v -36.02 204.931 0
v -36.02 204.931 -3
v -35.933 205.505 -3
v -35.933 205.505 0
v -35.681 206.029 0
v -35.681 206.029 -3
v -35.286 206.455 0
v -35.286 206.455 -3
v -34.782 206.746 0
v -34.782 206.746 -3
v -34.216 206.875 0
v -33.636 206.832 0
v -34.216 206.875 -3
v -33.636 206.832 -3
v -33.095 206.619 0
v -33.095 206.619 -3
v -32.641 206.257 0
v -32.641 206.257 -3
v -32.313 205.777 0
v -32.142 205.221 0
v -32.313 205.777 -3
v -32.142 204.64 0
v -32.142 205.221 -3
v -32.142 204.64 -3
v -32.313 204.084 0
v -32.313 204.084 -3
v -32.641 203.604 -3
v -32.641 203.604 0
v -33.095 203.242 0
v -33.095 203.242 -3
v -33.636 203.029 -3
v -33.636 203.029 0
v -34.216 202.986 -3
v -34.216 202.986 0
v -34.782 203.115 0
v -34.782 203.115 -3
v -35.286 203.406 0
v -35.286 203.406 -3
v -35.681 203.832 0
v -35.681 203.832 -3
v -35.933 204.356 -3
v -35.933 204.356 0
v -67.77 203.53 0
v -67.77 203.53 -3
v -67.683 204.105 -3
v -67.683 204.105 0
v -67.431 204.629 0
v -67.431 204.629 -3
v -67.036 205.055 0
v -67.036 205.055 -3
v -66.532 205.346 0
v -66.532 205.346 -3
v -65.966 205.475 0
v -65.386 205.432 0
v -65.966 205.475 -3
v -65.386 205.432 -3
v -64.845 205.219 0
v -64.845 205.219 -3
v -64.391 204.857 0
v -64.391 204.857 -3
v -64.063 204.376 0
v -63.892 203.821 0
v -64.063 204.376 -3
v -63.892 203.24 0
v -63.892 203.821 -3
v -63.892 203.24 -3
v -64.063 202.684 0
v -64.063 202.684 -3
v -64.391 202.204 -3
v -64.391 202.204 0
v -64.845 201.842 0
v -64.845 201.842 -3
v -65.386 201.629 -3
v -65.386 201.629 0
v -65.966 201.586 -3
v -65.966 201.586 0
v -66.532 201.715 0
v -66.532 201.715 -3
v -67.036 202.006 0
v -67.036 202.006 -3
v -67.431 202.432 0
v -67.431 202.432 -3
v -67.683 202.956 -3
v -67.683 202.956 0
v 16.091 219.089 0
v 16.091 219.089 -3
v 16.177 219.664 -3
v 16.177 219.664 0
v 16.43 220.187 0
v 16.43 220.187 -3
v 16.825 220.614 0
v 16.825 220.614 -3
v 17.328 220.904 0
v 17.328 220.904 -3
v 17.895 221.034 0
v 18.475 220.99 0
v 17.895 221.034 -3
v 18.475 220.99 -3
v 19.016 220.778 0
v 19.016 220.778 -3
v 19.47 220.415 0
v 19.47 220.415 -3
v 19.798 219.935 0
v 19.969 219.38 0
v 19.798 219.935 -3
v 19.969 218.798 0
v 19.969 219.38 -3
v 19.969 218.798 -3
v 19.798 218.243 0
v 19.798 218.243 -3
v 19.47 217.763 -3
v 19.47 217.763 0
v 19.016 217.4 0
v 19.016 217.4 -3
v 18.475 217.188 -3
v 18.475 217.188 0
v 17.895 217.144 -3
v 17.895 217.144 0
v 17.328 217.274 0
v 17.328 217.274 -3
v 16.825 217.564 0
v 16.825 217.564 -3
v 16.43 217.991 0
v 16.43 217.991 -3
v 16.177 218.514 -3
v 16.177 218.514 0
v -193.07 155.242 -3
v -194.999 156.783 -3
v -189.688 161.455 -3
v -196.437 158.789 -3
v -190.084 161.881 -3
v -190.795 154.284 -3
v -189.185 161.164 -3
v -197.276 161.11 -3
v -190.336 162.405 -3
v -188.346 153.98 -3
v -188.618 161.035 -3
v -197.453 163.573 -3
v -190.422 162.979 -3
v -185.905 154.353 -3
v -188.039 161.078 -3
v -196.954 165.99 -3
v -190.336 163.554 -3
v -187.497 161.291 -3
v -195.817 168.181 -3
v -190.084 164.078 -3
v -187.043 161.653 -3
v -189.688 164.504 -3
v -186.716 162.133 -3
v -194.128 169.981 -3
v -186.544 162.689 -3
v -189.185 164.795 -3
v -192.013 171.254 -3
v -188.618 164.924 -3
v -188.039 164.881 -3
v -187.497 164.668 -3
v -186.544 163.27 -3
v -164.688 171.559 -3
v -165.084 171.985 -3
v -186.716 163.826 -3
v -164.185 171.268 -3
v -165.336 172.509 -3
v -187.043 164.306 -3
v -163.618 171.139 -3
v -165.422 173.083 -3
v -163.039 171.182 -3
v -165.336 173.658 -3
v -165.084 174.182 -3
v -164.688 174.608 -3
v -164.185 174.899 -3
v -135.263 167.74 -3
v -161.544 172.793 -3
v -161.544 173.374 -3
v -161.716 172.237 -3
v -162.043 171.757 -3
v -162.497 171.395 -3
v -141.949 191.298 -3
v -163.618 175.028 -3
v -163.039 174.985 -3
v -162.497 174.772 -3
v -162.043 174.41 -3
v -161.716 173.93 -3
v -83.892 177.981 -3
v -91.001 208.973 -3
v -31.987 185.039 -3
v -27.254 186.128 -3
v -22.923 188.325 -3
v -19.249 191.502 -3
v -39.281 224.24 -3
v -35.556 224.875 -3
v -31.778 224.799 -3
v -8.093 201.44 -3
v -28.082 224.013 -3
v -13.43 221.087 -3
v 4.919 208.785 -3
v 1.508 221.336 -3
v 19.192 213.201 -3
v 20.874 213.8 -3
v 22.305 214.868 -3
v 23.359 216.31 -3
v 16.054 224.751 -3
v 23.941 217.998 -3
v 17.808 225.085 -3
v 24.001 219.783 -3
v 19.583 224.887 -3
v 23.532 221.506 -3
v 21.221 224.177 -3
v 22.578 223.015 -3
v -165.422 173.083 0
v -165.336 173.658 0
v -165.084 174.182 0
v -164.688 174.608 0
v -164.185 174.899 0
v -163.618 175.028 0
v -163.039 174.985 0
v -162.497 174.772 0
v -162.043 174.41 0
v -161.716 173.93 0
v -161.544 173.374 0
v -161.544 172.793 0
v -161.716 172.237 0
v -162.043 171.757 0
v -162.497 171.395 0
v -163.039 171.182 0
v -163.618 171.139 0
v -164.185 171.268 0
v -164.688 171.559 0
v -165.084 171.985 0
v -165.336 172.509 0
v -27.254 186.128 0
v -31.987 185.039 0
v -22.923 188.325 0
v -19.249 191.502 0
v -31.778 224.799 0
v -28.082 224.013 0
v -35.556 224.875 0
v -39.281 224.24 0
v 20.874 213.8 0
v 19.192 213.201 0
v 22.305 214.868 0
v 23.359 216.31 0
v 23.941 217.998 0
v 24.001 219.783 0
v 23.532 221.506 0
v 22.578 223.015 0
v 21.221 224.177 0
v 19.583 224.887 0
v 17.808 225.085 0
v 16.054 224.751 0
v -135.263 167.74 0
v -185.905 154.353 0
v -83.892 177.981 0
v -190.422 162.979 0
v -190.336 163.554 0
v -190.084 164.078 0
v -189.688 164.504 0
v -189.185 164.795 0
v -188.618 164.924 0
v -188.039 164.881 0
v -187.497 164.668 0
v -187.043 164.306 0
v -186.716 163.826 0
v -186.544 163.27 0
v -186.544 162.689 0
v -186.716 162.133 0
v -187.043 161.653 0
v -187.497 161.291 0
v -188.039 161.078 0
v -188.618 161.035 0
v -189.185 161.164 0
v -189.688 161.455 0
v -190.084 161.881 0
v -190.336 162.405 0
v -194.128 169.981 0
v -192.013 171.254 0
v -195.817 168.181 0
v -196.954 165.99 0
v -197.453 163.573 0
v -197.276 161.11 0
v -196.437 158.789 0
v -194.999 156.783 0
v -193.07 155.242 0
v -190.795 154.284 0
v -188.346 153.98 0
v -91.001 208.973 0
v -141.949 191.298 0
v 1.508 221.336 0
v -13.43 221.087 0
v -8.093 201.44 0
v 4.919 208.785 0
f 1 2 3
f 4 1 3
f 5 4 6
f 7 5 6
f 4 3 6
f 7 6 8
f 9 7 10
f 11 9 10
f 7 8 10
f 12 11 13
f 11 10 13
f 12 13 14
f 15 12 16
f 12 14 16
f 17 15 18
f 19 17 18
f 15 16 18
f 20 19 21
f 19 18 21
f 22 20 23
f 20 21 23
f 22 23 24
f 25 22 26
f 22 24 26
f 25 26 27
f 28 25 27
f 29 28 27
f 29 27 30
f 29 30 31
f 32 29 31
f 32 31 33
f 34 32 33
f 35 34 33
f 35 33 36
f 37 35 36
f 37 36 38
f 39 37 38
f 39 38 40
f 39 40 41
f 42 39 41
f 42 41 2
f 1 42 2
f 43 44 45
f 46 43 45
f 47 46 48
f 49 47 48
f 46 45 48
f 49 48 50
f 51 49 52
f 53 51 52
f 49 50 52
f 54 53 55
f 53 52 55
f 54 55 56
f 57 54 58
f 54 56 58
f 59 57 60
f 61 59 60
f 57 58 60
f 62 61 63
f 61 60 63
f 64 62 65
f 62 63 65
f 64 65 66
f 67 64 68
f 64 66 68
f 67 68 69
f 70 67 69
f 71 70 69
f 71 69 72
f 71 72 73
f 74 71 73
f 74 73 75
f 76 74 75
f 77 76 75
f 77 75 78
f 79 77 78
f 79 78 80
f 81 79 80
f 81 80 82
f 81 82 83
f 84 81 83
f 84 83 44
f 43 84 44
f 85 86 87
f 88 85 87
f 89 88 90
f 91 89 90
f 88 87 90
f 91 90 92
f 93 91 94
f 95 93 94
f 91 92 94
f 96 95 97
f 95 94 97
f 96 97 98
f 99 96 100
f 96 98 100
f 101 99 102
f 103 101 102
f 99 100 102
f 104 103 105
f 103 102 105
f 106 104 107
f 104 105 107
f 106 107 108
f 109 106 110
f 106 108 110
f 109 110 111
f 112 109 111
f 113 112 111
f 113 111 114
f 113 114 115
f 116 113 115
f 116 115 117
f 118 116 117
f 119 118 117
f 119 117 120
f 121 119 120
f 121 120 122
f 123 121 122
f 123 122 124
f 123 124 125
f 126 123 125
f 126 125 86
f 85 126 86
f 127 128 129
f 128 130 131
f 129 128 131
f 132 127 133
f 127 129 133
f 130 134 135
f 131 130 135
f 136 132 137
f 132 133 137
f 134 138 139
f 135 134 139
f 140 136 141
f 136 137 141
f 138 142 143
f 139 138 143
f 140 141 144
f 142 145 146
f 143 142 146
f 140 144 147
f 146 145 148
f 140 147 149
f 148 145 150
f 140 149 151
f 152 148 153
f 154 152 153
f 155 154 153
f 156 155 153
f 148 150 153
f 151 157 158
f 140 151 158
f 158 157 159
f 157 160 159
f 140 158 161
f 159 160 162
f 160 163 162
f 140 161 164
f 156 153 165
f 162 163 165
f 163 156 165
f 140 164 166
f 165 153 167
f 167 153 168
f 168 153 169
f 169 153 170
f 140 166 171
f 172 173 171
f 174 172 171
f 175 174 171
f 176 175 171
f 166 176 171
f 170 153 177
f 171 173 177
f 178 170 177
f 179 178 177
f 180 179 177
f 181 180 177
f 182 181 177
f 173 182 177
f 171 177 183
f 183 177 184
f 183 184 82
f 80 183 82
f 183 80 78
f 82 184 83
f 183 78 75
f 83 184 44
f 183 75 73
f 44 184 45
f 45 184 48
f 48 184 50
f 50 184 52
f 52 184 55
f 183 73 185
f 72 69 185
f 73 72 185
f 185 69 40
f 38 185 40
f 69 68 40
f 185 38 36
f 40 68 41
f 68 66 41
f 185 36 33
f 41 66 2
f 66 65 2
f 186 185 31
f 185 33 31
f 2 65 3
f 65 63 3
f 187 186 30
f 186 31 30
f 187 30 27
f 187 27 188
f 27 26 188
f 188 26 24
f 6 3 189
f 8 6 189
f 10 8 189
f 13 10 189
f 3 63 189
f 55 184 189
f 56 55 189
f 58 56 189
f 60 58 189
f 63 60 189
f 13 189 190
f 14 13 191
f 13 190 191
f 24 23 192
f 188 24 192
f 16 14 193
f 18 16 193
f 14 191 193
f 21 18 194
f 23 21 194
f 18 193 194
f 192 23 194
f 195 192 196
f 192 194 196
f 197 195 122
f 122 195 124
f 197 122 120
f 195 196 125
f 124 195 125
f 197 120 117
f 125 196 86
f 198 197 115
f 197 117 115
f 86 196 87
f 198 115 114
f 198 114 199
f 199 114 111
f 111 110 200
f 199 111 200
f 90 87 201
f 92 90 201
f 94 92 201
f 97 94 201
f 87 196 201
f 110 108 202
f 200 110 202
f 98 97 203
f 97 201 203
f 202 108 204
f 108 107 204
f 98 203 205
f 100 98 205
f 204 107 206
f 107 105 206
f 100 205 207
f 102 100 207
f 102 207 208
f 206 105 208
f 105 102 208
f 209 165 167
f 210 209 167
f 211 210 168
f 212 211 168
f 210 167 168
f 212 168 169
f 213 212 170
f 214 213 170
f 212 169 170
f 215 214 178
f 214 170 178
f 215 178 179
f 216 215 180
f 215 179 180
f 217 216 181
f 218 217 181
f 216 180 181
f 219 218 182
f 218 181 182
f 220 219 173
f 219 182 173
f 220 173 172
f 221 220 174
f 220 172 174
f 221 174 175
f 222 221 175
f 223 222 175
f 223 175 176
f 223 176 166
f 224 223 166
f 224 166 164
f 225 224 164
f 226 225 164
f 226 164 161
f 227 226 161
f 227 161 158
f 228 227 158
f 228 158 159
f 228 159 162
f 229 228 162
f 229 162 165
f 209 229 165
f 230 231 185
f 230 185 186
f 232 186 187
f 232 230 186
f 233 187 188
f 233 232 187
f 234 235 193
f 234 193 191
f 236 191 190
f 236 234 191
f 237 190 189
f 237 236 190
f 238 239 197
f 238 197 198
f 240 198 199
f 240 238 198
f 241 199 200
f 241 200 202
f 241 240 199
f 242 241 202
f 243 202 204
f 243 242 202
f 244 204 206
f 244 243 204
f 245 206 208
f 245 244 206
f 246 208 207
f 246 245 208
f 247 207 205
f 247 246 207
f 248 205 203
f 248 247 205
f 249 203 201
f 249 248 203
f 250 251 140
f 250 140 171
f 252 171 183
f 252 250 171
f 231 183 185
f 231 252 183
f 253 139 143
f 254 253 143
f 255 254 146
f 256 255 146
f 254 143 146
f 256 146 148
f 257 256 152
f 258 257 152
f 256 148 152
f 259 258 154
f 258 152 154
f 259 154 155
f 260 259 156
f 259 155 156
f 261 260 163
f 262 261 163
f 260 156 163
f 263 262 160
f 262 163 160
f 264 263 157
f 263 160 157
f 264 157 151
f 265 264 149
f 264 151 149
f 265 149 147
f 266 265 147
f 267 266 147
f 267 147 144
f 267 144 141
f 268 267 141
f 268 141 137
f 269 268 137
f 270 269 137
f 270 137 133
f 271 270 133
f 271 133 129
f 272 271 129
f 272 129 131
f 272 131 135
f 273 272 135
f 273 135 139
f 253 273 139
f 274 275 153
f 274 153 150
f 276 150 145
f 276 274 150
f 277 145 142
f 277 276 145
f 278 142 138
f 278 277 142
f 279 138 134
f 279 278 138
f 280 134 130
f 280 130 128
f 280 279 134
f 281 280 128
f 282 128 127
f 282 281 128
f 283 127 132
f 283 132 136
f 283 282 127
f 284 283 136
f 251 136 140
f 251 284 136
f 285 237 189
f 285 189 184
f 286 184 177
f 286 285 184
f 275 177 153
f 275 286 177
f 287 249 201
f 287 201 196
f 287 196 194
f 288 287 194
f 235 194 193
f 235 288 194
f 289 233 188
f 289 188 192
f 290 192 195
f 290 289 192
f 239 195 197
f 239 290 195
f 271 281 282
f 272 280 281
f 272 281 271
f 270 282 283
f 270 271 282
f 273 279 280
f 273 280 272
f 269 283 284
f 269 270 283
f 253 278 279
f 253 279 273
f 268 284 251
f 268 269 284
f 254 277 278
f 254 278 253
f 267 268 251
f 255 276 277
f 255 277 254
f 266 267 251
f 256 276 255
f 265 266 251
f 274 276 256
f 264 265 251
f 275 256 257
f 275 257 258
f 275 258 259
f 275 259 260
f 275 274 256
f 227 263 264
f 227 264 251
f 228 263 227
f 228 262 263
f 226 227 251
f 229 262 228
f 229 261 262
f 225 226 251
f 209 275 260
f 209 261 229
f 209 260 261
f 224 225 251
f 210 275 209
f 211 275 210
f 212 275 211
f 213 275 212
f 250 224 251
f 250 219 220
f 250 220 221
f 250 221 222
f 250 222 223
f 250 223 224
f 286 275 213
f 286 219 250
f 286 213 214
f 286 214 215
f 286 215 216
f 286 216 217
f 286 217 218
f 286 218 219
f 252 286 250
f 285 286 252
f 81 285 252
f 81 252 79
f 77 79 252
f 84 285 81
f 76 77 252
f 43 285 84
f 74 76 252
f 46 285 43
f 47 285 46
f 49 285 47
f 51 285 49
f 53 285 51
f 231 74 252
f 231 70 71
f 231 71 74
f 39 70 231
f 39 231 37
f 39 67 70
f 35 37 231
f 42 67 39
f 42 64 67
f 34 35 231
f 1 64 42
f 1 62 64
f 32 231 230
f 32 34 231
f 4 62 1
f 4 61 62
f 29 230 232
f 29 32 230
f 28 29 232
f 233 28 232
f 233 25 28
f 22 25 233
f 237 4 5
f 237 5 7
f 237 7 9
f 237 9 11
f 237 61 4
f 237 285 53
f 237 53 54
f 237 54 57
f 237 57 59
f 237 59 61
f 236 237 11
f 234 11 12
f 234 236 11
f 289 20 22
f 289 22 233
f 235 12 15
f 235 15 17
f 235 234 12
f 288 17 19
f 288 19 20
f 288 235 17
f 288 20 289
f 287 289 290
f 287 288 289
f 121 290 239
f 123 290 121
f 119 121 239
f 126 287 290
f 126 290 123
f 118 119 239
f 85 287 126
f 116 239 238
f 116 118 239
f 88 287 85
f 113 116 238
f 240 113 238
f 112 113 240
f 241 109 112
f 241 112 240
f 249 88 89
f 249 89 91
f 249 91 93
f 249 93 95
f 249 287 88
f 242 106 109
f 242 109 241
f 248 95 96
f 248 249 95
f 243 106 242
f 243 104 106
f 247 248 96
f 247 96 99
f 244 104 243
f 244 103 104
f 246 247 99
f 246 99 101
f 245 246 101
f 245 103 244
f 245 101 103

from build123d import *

# Parameters (mm, degrees)
BOSS_EXTRUDE1_DEPTH        = 3
M3_5_CLEARANCE_HOLE1_D     = 3.9
M3_5_CLEARANCE_HOLE1_DEPTH = 10
M3_5_CLEARANCE_HOLE1_TIP   = 1.171678207


with BuildPart() as part:
    # Sketch2 → Boss-Extrude1 (new body)
    with BuildSketch(Plane.XY):
        with BuildLine():
            ThreePointArc((-39.28087001, 224.239774099), (-116.578963105, 200.433975785), (-192.012625607, 171.253951952))
            ThreePointArc((-192.012625607, 171.253951952), (-196.936776164, 159.92081589), (-185.905452535, 154.353309203))
            ThreePointArc((-185.905452535, 154.353309203), (-109.656081484, 173.256403098), (-31.987185034, 185.039274932))
            ThreePointArc((-31.987185034, 185.039274932), (-25.021326492, 187.094578874), (-19.248708765, 191.50188464))
            ThreePointArc((-19.248708765, 191.50188464), (-1.783402645, 205.460636468), (19.192242873, 213.200530885))
            ThreePointArc((19.192242873, 213.200530885), (23.830874934, 220.662171124), (16.054107446, 224.750553433))
            ThreePointArc((16.054107446, 224.750553433), (-5.954280946, 220.811707047), (-28.081978855, 224.013059218))
            ThreePointArc((-28.081978855, 224.013059218), (-33.665228727, 224.926425674), (-39.28087001, 224.239774099))
        make_face()
    extrude(amount=-BOSS_EXTRUDE1_DEPTH)

    # M3.5 Clearance Hole1
    with Locations(Plane.XY):
        with Locations((-188.472457343, 162.979460507), (-163.472457343, 173.083498563), (-65.820033869, 203.530407358), (-34.070033869, 204.930522774), (18.040784053, 219.089006289)):
            Hole(M3_5_CLEARANCE_HOLE1_D / 2, depth=M3_5_CLEARANCE_HOLE1_DEPTH)
            with Locations((0, 0, -(M3_5_CLEARANCE_HOLE1_DEPTH + M3_5_CLEARANCE_HOLE1_TIP / 2))):  # 118° drill point
                Cone(0, M3_5_CLEARANCE_HOLE1_D / 2, M3_5_CLEARANCE_HOLE1_TIP, mode=Mode.SUBTRACT)


solid = part.part
